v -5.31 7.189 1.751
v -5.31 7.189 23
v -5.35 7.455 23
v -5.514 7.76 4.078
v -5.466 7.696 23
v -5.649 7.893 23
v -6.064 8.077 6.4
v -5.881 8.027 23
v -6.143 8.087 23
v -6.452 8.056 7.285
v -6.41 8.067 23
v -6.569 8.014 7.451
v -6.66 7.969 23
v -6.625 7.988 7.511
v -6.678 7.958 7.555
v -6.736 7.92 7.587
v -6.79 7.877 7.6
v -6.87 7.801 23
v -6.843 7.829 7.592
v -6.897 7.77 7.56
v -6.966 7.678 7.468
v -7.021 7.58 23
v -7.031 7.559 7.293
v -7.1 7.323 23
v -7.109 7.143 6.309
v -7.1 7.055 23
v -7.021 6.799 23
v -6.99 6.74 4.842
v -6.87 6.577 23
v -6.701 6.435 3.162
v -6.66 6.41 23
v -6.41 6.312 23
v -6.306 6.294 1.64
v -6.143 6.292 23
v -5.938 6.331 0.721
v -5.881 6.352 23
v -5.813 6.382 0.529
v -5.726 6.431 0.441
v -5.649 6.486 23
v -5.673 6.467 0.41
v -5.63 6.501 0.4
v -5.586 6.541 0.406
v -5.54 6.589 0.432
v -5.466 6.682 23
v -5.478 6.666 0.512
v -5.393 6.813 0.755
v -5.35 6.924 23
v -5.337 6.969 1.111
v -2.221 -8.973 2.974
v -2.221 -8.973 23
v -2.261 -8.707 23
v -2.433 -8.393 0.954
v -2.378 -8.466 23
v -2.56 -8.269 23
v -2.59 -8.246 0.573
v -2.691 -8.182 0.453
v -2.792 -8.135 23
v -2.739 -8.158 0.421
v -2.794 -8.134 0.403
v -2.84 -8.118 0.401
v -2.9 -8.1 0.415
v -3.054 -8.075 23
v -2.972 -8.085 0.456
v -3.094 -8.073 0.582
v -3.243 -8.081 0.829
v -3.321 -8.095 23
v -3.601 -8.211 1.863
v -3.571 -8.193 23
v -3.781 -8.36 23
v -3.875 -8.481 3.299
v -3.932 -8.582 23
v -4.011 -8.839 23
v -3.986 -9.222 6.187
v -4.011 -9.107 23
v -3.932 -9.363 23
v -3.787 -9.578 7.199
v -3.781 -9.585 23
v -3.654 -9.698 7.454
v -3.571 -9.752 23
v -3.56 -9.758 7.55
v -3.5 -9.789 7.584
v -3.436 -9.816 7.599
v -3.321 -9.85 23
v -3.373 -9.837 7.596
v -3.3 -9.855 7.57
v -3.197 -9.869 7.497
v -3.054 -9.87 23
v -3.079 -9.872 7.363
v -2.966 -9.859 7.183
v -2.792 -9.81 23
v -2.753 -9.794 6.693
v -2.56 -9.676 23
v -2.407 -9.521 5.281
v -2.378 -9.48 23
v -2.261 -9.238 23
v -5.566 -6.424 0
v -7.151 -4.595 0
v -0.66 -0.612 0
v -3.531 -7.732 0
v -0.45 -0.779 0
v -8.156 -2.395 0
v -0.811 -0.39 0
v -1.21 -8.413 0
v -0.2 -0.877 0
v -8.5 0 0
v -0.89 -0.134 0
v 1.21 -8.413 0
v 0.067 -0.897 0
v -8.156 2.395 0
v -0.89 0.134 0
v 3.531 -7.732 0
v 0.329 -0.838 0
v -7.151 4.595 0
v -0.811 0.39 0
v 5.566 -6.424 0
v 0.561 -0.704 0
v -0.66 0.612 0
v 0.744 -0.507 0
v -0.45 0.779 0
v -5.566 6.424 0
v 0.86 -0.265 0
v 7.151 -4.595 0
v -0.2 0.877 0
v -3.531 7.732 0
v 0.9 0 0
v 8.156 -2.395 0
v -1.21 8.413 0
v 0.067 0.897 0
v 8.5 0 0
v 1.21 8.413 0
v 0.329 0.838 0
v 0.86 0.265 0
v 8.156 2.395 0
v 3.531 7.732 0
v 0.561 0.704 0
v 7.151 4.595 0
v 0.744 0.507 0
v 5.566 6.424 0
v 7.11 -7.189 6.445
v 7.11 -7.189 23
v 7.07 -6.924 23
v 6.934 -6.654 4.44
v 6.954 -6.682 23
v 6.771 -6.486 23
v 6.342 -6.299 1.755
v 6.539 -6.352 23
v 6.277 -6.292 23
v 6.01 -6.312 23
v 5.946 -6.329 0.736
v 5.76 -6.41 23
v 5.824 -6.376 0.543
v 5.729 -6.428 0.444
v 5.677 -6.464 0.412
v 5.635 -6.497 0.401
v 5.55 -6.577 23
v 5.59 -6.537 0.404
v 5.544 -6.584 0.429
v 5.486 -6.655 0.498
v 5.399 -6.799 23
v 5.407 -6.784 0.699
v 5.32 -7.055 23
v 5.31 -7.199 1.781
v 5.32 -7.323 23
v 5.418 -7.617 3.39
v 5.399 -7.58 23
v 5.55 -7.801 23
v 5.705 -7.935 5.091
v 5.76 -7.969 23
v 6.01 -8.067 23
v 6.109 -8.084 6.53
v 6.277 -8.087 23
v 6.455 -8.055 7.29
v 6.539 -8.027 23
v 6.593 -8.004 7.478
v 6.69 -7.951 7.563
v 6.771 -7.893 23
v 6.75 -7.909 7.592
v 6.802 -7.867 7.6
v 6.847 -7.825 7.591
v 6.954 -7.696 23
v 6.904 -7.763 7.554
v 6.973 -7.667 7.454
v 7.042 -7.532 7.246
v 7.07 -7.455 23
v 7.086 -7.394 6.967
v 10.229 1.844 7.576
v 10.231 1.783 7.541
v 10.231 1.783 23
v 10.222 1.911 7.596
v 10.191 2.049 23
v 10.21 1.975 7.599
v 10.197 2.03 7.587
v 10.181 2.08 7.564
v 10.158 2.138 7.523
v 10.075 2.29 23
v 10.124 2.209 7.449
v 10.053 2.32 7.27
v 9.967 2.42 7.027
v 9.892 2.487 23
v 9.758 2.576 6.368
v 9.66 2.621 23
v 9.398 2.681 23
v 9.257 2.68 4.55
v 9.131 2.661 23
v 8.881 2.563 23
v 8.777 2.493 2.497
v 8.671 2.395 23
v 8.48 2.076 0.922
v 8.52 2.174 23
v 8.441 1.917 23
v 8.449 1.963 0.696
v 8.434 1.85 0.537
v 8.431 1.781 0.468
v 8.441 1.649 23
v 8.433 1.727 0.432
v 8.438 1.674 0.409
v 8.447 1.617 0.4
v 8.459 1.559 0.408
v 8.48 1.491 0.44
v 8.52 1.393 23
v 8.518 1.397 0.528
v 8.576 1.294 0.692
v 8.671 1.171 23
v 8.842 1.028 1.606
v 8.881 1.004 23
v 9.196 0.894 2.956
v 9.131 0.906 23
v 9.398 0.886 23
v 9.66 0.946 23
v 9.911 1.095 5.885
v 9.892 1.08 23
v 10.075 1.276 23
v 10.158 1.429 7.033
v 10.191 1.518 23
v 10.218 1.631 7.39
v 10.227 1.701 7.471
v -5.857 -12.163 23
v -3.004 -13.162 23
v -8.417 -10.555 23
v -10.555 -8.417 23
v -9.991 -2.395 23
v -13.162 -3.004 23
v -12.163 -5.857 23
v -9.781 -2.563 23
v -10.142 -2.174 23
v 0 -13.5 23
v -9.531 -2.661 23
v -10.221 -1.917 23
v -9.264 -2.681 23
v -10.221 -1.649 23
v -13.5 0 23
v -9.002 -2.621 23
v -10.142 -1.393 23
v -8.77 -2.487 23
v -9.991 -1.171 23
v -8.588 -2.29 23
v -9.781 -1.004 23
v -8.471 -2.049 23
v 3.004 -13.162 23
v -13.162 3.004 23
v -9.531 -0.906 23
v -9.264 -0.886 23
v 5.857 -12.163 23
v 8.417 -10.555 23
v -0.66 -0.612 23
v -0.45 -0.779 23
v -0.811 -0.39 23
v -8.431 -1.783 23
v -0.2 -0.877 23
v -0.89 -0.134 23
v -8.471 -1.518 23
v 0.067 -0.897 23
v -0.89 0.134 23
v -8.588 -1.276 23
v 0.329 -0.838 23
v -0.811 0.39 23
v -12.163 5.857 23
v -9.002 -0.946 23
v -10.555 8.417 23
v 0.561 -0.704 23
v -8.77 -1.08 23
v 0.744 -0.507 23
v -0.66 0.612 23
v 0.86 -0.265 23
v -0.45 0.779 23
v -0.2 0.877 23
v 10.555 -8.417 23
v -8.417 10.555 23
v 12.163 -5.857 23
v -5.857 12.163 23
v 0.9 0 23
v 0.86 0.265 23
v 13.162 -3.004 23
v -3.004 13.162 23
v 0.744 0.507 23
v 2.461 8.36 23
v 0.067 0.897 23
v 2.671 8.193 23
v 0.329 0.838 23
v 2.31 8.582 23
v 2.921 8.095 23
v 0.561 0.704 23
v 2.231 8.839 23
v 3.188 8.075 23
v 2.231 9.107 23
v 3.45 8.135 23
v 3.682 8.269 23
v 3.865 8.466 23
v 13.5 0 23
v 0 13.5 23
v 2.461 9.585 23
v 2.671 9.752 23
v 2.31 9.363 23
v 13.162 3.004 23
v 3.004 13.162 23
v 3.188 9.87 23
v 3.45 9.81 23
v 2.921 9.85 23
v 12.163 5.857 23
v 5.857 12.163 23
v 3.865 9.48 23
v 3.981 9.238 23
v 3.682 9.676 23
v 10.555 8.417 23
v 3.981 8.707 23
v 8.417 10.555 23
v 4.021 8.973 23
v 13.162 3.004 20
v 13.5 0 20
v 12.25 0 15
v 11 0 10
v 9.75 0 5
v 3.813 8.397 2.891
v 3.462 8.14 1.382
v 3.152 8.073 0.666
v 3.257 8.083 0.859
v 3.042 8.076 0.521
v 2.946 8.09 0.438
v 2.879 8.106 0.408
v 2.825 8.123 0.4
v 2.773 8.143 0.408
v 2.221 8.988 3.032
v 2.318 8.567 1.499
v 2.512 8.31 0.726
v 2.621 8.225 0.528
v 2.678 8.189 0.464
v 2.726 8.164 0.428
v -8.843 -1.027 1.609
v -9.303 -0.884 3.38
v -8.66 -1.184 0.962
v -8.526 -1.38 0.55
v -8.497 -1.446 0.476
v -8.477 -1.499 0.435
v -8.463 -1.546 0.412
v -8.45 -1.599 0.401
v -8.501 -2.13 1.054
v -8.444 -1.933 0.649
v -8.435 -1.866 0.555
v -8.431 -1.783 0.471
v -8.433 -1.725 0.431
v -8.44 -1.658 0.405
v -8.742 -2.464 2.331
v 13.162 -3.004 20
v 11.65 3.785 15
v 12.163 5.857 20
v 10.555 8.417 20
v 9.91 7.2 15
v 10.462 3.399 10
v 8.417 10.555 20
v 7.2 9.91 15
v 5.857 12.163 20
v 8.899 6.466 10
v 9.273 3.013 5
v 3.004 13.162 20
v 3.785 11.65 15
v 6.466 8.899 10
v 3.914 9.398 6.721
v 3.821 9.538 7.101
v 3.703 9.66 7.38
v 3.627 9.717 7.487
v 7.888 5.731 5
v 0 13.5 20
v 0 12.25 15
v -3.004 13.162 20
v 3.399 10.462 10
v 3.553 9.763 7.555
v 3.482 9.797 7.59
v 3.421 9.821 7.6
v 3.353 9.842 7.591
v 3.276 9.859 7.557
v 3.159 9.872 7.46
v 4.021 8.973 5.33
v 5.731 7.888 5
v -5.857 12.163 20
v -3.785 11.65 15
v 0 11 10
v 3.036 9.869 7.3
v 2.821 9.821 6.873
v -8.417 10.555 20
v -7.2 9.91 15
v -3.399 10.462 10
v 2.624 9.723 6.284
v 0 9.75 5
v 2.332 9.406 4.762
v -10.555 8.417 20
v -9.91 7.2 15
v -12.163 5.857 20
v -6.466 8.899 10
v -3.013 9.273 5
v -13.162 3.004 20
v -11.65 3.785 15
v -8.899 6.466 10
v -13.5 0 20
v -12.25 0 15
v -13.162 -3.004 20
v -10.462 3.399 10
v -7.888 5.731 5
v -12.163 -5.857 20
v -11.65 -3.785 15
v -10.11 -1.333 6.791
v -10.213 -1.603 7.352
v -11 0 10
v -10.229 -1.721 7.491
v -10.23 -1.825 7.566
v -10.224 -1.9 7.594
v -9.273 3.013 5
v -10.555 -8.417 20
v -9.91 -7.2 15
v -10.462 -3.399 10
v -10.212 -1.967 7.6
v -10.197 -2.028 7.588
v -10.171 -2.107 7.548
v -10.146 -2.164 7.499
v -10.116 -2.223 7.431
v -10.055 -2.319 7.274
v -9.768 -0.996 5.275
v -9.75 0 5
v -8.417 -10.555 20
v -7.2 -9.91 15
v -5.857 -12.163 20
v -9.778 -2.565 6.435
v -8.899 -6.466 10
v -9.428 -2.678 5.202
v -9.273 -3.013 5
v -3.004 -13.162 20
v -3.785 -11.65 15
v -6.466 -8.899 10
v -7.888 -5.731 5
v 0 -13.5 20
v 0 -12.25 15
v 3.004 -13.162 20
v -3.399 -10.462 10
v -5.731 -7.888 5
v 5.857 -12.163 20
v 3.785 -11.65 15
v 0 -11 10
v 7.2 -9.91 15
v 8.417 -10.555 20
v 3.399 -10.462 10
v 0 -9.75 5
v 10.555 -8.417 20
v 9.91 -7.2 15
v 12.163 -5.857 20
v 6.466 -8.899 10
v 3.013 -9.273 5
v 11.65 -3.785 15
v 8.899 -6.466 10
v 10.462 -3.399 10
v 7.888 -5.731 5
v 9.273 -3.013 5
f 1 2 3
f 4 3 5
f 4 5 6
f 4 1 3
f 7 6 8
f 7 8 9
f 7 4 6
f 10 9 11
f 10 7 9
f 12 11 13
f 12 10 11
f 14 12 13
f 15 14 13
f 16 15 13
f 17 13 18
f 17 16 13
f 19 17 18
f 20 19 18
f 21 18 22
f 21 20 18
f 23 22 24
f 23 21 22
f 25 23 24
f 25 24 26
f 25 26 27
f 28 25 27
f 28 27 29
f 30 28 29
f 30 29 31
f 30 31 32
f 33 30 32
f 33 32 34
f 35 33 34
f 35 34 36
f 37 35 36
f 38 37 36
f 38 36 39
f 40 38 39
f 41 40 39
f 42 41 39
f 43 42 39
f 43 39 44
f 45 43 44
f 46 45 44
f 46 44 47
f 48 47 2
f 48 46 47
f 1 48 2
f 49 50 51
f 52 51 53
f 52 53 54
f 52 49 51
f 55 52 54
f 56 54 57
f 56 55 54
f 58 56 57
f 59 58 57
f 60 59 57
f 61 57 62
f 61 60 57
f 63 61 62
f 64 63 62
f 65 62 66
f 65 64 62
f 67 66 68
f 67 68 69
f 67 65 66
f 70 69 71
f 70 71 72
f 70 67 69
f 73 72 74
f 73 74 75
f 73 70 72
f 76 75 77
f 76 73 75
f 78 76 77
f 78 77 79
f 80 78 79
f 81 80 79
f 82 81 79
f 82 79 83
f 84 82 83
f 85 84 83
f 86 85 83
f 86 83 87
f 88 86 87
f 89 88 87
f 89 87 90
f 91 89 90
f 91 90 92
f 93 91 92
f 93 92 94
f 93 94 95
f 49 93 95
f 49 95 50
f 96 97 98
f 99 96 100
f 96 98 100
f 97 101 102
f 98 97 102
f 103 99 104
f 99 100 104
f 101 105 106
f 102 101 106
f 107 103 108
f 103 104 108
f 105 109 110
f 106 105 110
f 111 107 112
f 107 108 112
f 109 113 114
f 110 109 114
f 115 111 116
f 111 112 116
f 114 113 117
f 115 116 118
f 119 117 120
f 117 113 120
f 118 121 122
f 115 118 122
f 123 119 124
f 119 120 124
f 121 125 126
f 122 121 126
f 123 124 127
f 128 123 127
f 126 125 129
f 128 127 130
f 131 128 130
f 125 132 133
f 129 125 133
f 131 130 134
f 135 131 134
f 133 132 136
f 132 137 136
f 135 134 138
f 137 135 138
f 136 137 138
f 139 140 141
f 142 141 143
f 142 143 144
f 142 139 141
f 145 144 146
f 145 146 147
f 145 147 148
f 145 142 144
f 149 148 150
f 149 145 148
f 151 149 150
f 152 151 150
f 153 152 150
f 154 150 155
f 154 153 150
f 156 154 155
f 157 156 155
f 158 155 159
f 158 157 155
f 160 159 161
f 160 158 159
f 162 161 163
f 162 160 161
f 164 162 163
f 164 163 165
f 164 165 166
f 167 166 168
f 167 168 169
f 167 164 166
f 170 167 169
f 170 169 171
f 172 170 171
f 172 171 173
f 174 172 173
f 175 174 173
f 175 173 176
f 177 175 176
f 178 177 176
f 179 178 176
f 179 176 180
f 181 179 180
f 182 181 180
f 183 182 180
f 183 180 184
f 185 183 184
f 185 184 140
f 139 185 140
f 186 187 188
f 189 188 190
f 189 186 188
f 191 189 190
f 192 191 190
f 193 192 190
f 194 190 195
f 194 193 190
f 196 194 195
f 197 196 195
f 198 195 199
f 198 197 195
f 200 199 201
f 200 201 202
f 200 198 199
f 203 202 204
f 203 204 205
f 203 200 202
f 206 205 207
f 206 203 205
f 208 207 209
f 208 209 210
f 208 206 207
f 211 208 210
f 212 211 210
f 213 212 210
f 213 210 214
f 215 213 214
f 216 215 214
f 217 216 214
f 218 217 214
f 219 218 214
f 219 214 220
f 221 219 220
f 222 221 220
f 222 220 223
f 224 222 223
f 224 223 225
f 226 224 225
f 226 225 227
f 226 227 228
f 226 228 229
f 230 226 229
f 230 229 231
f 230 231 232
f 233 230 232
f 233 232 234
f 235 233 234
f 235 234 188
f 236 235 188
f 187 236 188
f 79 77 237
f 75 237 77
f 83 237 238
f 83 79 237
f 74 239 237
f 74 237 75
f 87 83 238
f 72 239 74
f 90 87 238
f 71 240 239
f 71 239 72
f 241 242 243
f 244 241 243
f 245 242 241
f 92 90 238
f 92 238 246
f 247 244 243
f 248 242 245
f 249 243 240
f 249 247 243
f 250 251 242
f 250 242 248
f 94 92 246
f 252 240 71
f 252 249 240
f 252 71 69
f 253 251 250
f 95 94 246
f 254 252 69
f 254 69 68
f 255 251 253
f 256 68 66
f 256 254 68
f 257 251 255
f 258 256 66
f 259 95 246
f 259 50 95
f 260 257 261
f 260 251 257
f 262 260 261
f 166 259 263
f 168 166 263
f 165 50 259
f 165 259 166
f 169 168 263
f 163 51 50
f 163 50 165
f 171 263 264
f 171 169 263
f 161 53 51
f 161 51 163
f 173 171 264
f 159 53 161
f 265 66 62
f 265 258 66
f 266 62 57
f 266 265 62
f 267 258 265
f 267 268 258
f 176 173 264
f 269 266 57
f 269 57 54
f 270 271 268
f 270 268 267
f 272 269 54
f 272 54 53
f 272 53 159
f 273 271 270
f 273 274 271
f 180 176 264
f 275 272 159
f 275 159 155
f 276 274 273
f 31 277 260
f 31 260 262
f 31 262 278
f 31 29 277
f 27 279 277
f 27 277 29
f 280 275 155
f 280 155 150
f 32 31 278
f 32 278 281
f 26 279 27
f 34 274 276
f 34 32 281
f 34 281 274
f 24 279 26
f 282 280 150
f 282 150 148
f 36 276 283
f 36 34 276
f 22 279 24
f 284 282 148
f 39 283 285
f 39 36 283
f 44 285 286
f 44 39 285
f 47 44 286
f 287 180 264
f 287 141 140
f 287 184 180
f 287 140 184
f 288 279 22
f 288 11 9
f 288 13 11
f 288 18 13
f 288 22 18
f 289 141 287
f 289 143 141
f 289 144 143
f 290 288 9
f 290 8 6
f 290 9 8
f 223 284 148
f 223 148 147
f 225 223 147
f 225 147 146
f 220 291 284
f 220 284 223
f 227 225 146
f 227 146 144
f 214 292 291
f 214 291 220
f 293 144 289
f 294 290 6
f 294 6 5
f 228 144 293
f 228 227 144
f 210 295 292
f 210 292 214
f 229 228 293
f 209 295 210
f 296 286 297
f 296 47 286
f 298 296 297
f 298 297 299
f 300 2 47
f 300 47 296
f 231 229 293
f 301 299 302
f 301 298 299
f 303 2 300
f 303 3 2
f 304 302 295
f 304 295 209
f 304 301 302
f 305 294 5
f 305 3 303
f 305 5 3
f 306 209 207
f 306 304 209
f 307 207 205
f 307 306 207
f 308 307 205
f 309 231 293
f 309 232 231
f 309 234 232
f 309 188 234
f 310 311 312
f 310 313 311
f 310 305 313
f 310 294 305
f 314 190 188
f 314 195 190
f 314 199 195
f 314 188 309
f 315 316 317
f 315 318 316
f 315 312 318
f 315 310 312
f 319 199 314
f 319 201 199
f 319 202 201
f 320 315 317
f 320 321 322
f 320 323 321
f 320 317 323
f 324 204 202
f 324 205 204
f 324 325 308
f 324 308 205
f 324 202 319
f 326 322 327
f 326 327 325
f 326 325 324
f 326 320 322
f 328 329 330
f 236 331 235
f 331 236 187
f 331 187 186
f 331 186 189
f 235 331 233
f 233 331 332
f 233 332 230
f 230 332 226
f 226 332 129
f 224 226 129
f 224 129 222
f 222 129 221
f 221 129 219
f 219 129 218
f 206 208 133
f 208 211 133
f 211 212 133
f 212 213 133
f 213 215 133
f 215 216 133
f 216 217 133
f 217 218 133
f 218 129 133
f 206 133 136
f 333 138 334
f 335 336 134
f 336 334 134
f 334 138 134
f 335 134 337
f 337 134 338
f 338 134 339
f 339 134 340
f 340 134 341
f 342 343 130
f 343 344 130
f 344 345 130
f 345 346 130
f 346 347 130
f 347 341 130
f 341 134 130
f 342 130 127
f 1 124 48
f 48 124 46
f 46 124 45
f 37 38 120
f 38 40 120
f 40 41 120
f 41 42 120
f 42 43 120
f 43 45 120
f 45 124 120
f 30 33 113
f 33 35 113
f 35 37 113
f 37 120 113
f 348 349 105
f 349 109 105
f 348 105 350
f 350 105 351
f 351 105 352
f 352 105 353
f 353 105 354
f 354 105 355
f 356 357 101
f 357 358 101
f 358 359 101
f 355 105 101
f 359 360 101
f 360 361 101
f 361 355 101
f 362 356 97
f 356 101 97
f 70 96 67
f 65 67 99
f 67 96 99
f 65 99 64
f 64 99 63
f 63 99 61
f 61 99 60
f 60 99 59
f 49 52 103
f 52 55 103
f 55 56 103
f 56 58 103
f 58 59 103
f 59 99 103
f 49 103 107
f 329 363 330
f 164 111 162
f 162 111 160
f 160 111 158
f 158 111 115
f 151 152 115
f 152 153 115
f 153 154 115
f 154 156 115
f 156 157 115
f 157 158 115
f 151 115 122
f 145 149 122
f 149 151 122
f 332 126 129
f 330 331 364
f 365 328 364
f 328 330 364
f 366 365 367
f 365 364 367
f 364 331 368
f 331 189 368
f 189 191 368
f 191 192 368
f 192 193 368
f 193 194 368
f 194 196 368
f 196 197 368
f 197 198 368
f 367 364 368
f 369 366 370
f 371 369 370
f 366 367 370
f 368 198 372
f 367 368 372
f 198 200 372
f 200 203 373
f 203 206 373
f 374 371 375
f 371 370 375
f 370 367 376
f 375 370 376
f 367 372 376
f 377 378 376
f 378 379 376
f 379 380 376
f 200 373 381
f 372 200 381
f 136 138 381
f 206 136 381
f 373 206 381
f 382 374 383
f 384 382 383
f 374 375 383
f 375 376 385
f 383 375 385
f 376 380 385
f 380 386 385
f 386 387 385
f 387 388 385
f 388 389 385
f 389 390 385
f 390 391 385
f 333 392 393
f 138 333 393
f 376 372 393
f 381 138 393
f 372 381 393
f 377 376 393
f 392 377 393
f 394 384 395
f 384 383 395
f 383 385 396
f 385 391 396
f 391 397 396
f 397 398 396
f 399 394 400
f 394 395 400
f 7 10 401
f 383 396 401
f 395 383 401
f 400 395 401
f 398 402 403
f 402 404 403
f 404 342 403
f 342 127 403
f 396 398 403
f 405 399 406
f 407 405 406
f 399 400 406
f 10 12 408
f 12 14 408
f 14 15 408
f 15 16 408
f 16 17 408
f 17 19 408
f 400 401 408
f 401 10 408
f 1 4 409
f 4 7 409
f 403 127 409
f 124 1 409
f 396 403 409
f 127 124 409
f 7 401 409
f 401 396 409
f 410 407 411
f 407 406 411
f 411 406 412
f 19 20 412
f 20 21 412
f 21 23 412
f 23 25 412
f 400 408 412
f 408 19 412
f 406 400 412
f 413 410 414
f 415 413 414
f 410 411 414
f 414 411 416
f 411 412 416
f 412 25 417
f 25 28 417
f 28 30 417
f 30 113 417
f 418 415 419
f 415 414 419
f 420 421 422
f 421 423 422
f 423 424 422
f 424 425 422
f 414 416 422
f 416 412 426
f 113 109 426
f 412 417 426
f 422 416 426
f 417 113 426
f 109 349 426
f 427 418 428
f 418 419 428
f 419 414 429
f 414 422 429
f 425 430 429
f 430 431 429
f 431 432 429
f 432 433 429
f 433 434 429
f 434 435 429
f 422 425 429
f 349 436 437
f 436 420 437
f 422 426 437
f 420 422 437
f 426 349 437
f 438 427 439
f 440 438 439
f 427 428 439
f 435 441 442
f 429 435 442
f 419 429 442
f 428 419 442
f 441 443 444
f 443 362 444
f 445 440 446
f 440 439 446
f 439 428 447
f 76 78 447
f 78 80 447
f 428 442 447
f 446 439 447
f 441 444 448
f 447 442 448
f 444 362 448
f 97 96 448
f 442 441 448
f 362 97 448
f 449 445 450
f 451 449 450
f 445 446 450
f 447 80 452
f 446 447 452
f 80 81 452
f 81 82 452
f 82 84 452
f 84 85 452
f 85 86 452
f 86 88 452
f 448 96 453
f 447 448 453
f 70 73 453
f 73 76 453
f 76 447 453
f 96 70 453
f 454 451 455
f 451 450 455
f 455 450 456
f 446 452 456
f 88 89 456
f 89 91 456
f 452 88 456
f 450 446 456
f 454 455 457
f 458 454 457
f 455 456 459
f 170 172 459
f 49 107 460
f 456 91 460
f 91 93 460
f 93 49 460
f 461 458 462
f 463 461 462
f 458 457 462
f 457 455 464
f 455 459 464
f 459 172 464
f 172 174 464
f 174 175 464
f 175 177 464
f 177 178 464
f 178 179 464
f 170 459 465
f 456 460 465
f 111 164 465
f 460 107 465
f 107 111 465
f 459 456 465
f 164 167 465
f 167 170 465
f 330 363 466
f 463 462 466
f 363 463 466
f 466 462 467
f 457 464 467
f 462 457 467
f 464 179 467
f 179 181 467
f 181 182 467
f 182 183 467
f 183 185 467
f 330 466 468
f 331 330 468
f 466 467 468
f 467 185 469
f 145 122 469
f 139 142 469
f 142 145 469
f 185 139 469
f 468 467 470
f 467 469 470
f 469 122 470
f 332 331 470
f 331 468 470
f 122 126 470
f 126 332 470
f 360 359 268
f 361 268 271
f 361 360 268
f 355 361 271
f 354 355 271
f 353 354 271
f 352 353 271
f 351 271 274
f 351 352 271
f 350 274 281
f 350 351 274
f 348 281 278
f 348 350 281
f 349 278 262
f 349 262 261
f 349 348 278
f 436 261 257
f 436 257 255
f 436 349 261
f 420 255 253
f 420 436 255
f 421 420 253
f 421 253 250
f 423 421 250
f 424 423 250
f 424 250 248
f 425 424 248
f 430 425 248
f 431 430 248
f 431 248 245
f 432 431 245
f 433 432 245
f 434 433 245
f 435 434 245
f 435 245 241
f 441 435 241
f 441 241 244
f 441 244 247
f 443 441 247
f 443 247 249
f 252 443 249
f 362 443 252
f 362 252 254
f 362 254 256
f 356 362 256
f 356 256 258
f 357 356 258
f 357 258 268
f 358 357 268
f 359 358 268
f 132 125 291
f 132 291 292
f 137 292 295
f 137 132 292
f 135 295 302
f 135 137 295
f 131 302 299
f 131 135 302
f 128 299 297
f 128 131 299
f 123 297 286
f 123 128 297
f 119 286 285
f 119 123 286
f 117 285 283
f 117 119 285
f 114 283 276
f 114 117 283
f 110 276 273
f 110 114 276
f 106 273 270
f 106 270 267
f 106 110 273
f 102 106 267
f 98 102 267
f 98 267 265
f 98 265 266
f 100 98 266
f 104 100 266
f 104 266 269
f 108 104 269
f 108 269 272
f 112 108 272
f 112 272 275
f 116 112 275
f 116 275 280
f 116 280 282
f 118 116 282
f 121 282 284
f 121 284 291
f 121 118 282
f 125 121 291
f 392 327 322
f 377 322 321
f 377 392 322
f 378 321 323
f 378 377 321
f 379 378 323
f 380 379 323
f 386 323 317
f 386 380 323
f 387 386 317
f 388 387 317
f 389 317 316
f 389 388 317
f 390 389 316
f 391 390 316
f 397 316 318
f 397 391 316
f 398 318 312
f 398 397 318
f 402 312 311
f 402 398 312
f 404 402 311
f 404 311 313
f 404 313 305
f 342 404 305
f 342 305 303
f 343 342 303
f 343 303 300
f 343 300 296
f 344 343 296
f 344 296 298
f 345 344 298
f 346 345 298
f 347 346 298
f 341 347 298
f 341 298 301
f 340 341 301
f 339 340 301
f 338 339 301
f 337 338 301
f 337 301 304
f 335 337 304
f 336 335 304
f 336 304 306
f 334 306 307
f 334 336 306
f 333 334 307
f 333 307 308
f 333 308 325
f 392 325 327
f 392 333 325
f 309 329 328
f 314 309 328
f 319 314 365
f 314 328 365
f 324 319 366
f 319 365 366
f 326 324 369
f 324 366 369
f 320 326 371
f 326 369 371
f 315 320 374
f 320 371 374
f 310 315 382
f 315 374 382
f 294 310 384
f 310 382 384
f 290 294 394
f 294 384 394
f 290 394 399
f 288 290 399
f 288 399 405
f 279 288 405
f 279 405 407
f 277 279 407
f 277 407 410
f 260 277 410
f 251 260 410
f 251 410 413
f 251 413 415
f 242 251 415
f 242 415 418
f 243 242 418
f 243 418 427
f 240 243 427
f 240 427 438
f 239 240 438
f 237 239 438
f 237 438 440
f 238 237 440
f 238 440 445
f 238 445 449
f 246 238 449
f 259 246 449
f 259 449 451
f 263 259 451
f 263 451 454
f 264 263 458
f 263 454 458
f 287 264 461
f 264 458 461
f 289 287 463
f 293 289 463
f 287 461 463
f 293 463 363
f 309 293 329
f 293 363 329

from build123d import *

# Parameters (mm, degrees)
F0_R     = 13.5
F0_R_2   = 0.9
F1_DEPTH = 23


# Not quite as in the source:
# - a fillet or chamfer that OpenCascade refuses, or shapes differently, is made with other operations: its cross-section is extruded or revolved along the edge and cut away or added


with BuildPart() as f1:
    # F0 (on Top) → F1 (new body)
    with BuildSketch(Plane.XY):
        Circle(F0_R)
        with Locations((-3.1211513103, -8.9726481319)):
            Circle(F0_R_2, mode=Mode.SUBTRACT)
        with Locations((-9.3311168766, -1.7833277421)):
            Circle(F0_R_2, mode=Mode.SUBTRACT)
        with Locations((6.2099655662, -7.1893203897)):
            Circle(F0_R_2, mode=Mode.SUBTRACT)
        with Locations((-6.2099655662, 7.1893203897)):
            Circle(F0_R_2, mode=Mode.SUBTRACT)
        Circle(F0_R_2, mode=Mode.SUBTRACT)
        with Locations((9.3311168766, 1.7833277421)):
            Circle(F0_R_2, mode=Mode.SUBTRACT)
        with Locations((3.1211513103, 8.9726481319)):
            Circle(F0_R_2, mode=Mode.SUBTRACT)
    extrude(amount=F1_DEPTH)

    # F2: chamfer of 20 x 5 on 1 edges, made by hand

    # F2_s1 → F2_t2 (revolve, cut)
    with BuildSketch(Plane.XZ):
        Polygon((13.5, 20), (8.5, 0), (13.5, 0), align=None)
    revolve(axis=Axis((0, 0, 0), (0, 0, 1)), mode=Mode.SUBTRACT)


solid = f1.part
